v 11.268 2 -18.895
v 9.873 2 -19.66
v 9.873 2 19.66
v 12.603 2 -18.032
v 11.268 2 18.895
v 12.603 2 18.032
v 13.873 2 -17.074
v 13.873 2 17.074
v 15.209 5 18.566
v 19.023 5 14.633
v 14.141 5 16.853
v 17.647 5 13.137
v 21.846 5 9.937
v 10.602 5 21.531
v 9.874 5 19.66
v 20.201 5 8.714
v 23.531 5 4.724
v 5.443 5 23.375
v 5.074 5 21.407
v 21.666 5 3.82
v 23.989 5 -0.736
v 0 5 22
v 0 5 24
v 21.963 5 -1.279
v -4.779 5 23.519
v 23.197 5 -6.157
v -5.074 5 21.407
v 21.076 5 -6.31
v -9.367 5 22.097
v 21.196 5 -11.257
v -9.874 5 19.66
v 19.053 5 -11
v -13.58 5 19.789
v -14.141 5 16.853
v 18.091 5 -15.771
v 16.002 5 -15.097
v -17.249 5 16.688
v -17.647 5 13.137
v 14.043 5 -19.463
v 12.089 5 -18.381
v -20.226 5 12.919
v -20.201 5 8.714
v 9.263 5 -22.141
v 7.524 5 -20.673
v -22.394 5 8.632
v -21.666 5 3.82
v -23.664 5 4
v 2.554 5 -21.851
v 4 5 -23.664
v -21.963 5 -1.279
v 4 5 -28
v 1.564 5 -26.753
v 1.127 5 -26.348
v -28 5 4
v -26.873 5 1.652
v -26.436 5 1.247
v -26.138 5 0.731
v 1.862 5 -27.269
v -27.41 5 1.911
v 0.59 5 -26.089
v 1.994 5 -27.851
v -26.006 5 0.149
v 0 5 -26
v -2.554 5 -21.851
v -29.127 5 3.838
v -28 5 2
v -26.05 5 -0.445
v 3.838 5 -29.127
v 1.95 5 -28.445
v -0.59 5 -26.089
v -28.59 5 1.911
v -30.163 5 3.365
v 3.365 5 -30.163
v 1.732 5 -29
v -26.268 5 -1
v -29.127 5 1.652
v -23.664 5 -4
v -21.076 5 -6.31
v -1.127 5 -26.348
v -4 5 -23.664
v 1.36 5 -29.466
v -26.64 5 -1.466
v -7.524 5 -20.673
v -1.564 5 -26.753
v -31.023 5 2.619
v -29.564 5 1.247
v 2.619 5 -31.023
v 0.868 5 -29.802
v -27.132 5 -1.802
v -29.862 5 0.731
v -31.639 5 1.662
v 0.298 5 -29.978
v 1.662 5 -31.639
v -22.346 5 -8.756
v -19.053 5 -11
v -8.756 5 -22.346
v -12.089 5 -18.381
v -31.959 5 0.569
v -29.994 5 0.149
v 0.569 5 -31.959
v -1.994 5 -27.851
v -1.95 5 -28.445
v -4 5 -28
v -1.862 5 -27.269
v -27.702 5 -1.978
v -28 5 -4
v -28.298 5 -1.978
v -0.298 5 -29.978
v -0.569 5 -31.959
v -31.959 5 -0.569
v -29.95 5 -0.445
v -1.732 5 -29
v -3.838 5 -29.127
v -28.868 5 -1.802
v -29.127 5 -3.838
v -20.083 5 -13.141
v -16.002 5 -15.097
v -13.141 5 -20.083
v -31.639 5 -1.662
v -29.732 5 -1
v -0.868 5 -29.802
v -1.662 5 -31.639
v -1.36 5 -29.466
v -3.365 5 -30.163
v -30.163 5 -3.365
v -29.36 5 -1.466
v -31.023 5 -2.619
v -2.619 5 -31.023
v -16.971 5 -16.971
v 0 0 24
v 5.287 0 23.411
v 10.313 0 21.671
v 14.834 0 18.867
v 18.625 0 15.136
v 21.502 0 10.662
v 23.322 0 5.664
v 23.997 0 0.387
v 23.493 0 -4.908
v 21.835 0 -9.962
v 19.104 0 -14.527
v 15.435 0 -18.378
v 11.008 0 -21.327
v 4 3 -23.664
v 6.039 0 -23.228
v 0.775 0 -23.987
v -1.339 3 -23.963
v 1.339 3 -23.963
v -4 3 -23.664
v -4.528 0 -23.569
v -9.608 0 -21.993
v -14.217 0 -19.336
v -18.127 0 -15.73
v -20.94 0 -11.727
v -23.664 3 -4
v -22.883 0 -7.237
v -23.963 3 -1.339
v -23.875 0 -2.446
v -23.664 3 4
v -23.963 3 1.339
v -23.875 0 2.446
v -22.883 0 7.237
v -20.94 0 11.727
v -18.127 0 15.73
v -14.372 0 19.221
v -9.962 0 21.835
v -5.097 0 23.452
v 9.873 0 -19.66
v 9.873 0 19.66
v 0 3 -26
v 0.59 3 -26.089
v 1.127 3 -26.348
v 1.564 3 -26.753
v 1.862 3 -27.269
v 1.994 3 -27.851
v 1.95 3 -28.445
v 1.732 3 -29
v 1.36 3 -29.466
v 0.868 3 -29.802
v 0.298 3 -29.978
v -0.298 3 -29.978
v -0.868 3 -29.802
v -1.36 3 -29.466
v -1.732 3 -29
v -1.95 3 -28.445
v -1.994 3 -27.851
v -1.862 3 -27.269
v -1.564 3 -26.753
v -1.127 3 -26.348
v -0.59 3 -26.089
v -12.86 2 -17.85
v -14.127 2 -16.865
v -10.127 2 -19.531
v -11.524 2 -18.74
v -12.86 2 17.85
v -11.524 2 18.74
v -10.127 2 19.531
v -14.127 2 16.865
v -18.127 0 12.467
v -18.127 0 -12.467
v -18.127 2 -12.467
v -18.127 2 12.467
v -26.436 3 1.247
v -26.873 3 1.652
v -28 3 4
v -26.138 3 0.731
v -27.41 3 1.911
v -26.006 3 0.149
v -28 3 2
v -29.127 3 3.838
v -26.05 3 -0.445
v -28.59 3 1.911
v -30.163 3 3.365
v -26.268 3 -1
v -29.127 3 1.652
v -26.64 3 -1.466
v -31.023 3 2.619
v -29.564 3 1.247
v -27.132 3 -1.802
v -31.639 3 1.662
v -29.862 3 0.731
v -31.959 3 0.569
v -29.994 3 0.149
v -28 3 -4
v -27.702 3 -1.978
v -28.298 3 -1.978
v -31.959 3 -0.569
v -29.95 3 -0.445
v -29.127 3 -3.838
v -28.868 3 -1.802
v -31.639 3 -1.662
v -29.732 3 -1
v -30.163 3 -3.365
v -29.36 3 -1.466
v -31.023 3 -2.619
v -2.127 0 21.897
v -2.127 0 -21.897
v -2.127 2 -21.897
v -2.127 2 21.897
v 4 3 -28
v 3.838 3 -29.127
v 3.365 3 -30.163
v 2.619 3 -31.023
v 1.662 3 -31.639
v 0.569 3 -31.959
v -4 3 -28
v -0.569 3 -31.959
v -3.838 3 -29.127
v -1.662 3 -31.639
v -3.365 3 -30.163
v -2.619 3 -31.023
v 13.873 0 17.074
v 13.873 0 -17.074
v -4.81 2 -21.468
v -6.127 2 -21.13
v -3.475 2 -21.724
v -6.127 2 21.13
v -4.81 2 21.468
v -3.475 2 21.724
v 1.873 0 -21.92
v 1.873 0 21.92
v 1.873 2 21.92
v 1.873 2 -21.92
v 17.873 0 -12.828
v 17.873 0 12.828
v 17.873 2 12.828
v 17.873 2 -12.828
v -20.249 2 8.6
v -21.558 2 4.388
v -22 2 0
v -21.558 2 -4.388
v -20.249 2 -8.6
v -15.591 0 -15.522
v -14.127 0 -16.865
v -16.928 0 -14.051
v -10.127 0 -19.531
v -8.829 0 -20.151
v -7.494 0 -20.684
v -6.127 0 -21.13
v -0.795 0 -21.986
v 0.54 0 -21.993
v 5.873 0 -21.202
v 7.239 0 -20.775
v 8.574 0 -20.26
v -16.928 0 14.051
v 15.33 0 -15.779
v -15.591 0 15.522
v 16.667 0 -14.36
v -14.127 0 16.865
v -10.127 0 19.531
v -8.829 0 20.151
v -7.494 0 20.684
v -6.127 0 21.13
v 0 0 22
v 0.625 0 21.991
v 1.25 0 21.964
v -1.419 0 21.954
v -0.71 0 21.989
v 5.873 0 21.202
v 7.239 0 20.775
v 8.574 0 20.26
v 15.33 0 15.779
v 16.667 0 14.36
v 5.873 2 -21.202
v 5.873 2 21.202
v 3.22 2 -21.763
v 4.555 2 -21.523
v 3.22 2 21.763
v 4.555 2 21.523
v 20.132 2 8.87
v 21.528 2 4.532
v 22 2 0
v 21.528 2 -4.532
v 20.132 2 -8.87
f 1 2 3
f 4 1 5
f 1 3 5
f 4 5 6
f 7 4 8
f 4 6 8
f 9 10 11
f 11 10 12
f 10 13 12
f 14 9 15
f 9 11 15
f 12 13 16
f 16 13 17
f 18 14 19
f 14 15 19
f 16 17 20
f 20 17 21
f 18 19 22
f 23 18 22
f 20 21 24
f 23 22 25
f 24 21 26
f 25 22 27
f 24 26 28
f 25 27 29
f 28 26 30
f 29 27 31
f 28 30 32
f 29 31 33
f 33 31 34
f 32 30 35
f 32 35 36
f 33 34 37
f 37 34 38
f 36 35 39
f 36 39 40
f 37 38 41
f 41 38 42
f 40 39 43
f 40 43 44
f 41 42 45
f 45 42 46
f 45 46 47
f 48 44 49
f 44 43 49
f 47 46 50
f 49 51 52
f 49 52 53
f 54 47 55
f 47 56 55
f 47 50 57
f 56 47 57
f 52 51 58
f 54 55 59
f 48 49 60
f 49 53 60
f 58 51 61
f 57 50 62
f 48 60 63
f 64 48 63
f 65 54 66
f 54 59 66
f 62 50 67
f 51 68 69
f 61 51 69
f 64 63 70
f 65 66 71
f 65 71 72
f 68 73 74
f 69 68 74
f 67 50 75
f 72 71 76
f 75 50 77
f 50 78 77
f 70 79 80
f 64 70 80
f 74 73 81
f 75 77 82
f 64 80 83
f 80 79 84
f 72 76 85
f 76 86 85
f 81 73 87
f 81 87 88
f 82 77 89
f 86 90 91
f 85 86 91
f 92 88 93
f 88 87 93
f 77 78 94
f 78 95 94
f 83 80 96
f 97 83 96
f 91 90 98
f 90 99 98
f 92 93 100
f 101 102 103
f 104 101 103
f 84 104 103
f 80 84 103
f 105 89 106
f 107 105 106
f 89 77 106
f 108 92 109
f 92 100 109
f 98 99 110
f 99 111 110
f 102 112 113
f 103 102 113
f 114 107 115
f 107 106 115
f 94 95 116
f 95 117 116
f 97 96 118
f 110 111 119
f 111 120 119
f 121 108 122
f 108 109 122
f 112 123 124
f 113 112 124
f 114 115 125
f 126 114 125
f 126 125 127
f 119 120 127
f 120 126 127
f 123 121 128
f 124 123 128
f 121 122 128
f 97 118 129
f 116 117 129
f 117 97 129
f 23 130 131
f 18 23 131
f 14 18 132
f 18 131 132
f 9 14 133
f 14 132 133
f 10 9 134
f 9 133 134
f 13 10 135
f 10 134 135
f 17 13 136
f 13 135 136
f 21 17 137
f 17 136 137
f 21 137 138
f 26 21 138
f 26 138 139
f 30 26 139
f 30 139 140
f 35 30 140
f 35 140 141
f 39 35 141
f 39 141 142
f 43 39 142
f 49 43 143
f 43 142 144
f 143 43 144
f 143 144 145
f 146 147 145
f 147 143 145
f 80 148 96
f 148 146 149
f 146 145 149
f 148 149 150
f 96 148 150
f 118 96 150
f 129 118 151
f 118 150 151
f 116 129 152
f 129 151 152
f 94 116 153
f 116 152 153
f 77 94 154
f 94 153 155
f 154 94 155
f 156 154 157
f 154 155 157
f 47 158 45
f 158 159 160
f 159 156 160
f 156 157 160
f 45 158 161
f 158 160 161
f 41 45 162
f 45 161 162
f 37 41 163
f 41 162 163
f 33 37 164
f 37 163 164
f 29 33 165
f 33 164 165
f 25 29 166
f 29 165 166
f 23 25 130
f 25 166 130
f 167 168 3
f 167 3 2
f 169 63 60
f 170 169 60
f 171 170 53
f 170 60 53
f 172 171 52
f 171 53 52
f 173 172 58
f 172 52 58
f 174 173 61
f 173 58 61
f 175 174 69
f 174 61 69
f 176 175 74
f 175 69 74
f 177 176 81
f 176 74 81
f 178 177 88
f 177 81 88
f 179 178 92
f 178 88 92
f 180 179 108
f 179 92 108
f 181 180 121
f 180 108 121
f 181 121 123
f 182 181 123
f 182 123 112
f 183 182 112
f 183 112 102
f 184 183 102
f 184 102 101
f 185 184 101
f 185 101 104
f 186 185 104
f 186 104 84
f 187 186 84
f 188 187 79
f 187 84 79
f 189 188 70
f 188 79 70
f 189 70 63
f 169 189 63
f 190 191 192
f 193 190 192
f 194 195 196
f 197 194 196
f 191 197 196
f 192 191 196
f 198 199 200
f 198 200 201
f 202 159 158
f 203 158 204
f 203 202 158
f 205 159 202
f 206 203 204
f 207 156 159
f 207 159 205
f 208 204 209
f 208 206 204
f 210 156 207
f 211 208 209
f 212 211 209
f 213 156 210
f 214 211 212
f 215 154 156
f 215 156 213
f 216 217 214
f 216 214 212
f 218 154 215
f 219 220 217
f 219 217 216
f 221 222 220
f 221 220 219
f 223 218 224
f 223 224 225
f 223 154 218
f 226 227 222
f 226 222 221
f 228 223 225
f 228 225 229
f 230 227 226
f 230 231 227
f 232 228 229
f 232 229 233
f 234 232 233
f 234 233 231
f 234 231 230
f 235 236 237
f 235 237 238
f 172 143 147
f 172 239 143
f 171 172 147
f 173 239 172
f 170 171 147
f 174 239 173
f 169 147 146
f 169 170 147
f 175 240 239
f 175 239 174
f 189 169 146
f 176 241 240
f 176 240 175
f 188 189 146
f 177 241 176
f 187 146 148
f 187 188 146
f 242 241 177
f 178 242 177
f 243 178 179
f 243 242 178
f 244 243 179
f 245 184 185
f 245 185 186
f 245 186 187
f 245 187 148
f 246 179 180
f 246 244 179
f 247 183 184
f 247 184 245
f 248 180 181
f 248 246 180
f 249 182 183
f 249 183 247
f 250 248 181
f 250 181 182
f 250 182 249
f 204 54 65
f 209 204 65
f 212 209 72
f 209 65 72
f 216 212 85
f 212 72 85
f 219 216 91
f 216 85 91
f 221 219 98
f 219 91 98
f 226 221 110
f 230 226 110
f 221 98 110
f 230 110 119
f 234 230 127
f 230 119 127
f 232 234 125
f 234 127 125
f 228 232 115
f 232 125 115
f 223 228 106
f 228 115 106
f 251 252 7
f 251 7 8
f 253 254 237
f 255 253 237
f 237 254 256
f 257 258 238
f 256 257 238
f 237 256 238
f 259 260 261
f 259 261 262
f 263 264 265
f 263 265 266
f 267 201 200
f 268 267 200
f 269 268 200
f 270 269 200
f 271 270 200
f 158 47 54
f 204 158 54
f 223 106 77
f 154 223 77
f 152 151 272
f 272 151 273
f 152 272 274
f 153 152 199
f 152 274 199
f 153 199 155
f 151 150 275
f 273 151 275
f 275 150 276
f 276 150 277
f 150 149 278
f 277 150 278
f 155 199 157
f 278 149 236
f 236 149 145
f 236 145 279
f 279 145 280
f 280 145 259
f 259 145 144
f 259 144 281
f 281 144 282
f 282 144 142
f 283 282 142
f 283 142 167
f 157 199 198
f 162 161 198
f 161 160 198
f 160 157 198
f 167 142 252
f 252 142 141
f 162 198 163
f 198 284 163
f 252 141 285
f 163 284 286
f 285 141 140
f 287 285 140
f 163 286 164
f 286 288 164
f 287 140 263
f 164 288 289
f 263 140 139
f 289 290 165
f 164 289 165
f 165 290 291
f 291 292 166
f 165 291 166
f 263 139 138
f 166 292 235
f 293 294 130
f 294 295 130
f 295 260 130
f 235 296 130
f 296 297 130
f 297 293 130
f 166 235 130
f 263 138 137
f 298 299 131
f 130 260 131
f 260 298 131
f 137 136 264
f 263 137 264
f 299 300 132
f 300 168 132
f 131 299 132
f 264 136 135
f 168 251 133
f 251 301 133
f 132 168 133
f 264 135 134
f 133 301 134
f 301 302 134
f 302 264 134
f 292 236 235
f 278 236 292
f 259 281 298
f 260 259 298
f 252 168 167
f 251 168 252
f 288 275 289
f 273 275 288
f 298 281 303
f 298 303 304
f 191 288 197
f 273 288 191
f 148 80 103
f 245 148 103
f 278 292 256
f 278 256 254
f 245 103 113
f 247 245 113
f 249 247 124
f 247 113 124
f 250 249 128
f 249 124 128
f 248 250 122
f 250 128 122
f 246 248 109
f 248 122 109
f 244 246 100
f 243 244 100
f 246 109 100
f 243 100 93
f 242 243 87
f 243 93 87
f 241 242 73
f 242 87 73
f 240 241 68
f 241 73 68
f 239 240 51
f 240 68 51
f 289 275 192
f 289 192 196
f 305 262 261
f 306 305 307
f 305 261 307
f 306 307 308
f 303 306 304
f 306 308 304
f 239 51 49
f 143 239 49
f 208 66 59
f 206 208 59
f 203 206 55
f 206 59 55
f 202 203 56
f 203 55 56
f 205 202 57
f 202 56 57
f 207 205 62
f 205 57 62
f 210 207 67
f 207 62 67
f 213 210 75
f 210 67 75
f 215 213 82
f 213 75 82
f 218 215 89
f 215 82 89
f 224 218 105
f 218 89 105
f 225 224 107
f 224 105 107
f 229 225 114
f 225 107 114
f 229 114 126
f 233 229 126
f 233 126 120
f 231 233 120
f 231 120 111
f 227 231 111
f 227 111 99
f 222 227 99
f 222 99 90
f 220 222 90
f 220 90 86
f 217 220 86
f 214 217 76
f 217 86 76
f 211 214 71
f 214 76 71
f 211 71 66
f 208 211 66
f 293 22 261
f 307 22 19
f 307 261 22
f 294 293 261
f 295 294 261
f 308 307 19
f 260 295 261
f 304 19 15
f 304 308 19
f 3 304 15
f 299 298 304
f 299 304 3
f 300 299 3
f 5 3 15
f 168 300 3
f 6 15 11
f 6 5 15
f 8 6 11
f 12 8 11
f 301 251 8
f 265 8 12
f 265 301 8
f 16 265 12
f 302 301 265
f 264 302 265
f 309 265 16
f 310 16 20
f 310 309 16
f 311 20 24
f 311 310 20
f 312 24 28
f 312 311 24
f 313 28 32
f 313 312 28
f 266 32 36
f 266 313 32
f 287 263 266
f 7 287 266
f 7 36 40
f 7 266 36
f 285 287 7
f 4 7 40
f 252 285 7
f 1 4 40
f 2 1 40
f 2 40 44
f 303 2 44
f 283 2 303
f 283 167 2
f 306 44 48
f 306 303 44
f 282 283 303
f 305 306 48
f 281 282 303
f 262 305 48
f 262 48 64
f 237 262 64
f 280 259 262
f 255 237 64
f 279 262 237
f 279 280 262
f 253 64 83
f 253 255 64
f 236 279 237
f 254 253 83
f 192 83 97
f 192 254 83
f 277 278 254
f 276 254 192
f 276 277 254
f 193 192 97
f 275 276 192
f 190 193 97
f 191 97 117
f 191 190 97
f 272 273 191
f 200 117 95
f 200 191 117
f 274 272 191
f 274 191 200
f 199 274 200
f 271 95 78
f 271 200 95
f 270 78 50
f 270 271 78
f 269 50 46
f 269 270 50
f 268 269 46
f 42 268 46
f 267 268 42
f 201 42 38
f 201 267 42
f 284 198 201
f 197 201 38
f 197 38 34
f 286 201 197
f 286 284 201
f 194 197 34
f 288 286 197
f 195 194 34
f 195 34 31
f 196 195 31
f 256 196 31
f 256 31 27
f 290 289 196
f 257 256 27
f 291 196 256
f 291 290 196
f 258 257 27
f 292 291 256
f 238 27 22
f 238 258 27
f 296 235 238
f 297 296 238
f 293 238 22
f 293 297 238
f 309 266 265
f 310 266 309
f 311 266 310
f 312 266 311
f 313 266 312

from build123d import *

# Parameters (mm, degrees)
SKETCH1_R           = 24
SKETCH1_R_2         = 22
BOSS_EXTRUDE1_DEPTH = 5
BOSS_EXTRUDE2_DEPTH = 2
SKETCH3_R           = 2
BOSS_EXTRUDE3_DEPTH = 2


with BuildPart() as part:
    # Sketch1 → Boss-Extrude1 (new body)
    with BuildSketch(Plane(origin=(0, 0, 0), x_dir=(1, 0, 0), z_dir=(0, 1, 0))):
        with Locations(Location((0, 0, 0), (0, 0, 270))):
            Circle(SKETCH1_R)
        with Locations(Location((0, 0, 0), (0, 0, 270))):
            Circle(SKETCH1_R_2, mode=Mode.SUBTRACT)
    extrude(amount=BOSS_EXTRUDE1_DEPTH)

    # Sketch2 → Boss-Extrude2 (add)
    with BuildSketch(Plane.XZ):
        with BuildLine():
            Line((-18.126828112, 12.833489636), (-18.126828112, 15.729529636))
            ThreePointArc((-18.126828112, 15.729529636), (-24, 0), (-18.126828112, -15.729529636))
            Line((-18.126828112, -15.729529636), (-18.126828112, -12.833489636))
            ThreePointArc((-18.126828112, -12.833489636), (-22.209915661, 0), (-18.126828112, 12.833489636))
        make_face()
        with BuildLine():
            Line((-18.126828112, -12.466679694), (-18.126828112, 12.466679694))
            ThreePointArc((-18.126828112, 12.466679694), (-22, 0), (-18.126828112, -12.466679694))
        make_face()
        with BuildLine():
            ThreePointArc((-10.126828112, 19.530677213), (-12.199845938, 18.307478229), (-14.126828112, 16.865133485))
            Line((-14.126828112, 16.865133485), (-14.126828112, -16.865133485))
            ThreePointArc((-14.126828112, -16.865133485), (-12.199845938, -18.307478229), (-10.126828112, -19.530677213))
            Line((-10.126828112, -19.530677213), (-10.126828112, 19.530677213))
        make_face()
        with BuildLine():
            ThreePointArc((-2.126828112, 21.896954176), (-4.14462307, 21.606066269), (-6.126828112, 21.12964688))
            Line((-6.126828112, 21.12964688), (-6.126828112, -21.12964688))
            ThreePointArc((-6.126828112, -21.12964688), (-4.14462307, -21.606066269), (-2.126828112, -21.896954176))
            Line((-2.126828112, -21.896954176), (-2.126828112, 21.896954176))
        make_face()
        with BuildLine():
            ThreePointArc((5.873171888, 21.201553056), (3.889799677, 21.653393694), (1.873171888, 21.920110106))
            Line((1.873171888, 21.920110106), (1.873171888, -21.920110106))
            ThreePointArc((1.873171888, -21.920110106), (3.889799677, -21.653393694), (5.873171888, -21.201553056))
            Line((5.873171888, -21.201553056), (5.873171888, 21.201553056))
        make_face()
        with BuildLine():
            ThreePointArc((13.873171888, 17.074399017), (11.943353973, 18.475830045), (9.873171888, 19.66012403))
            Line((9.873171888, 19.66012403), (9.873171888, -19.66012403))
            ThreePointArc((9.873171888, -19.66012403), (11.943353973, -18.475830045), (13.873171888, -17.074399017))
            Line((13.873171888, -17.074399017), (13.873171888, 17.074399017))
        make_face()
        with BuildLine():
            ThreePointArc((22, 0), (20.94289595, 6.737589275), (17.873171888, 12.82769374))
            Line((17.873171888, 12.82769374), (17.873171888, -12.82769374))
            ThreePointArc((17.873171888, -12.82769374), (20.94289595, -6.737589275), (22, 0))
        make_face()
    extrude(amount=-BOSS_EXTRUDE2_DEPTH)

    # Sketch3 → Boss-Extrude3 (add)
    # profile 1 of 2: a face of its own
    with BuildSketch(Plane(origin=(0, 5, 0), x_dir=(1, 0, 0), z_dir=(0, 1, 0))):
        with BuildLine():
            Line((-28, 4), (-22.866655367, 4))
            Line((-22.866655367, 4), (-22.866655367, -4))
            Line((-22.866655367, -4), (-28, -4))
            ThreePointArc((-28, -4), (-32, 0), (-28, 4))
        make_face()
        with Locations(Location((-28, 0, 0), (0, 0, 270))):
            Circle(SKETCH3_R, mode=Mode.SUBTRACT)
    # profile 2 of 2: a face of its own
    with BuildSketch(Plane(origin=(0, 5, 0), x_dir=(1, 0, 0), z_dir=(0, 1, 0))):
        with BuildLine():
            Line((-4, 22.866655367), (-4, 28))
            ThreePointArc((-4, 28), (0, 32), (4, 28))
            Line((4, 28), (4, 22.866655367))
            Line((4, 22.866655367), (-4, 22.866655367))
        make_face()
        with Locations(Location((0, 28, 0), (0, 0, 270))):
            Circle(SKETCH3_R, mode=Mode.SUBTRACT)
    extrude(amount=-BOSS_EXTRUDE3_DEPTH)


solid = part.part
